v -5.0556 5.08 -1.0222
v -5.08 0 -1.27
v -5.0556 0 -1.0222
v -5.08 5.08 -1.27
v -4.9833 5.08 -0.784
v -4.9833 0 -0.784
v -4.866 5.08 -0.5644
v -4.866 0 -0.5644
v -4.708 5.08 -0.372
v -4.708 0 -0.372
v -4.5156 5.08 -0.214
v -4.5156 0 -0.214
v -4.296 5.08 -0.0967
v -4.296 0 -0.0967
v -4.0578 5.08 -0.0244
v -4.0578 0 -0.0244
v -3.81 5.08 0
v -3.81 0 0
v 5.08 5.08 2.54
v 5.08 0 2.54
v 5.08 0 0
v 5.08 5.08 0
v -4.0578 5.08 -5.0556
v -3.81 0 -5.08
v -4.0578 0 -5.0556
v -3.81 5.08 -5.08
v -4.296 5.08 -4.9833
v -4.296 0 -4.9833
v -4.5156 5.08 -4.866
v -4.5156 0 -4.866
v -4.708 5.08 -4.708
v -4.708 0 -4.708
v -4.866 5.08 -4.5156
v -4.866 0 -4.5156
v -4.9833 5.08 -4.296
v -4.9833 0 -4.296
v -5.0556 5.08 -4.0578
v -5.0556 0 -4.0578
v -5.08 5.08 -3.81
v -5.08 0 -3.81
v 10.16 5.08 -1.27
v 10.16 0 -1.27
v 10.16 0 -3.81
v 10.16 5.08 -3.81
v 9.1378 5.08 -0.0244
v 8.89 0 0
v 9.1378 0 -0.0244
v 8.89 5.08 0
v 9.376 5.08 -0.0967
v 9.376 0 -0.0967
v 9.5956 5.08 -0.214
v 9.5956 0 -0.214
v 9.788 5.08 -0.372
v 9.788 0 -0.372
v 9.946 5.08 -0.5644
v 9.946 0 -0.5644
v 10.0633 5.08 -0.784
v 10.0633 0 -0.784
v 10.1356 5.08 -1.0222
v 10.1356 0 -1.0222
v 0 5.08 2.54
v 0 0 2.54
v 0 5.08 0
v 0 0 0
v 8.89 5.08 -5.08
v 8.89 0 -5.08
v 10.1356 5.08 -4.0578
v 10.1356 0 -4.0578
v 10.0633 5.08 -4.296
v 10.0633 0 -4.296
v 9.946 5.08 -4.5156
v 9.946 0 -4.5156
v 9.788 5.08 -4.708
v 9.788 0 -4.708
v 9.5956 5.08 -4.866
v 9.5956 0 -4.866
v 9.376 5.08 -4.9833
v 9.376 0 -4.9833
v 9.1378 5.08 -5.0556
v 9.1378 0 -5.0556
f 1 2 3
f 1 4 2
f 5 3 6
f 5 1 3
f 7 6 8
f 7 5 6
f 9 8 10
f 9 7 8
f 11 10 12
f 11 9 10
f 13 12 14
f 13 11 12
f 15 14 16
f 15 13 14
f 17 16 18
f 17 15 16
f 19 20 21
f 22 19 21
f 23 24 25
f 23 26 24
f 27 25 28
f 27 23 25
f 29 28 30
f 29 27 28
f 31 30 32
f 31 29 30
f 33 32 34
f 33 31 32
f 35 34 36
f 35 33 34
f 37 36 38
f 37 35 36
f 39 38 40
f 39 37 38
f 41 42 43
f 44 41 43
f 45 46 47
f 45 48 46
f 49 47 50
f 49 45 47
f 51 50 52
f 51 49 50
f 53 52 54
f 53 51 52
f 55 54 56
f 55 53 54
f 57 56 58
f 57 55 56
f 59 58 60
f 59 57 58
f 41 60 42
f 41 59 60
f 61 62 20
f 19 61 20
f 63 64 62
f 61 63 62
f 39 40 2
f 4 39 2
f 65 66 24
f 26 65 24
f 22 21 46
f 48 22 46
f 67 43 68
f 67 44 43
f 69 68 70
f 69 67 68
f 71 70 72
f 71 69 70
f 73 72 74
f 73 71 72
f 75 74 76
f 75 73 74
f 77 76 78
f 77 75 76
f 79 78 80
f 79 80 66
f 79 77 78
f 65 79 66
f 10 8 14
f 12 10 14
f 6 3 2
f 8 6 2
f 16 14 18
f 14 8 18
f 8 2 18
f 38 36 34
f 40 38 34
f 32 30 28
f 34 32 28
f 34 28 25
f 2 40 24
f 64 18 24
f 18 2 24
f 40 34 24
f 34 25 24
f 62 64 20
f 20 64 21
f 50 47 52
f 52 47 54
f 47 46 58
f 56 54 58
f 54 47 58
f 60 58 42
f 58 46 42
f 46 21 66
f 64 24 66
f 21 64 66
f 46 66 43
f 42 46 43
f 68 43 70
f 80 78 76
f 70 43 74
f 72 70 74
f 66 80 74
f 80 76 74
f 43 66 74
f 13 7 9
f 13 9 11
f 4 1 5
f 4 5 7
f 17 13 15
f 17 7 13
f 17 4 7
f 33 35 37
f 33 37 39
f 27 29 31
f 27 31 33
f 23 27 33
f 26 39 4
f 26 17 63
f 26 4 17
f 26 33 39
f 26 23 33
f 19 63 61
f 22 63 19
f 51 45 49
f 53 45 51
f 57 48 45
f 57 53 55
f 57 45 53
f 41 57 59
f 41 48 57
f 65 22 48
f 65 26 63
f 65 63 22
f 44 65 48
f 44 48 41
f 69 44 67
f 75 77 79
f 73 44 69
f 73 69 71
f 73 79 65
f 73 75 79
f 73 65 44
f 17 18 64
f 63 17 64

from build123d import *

# Parameters (mm, degrees)
BOSS_EXTRUDE1_DEPTH = 5.08
FILLET1_R           = 1.27


with BuildPart() as part:
    # Sketch1 → Boss-Extrude1 (new body)
    with BuildSketch(Plane(origin=(0, 0, 0), x_dir=(1, 0, 0), z_dir=(0, 1, 0))):
        Polygon((5.08, 0), (10.16, 0), (10.16, 5.08), (-5.08, 5.08), (-5.08, 0), (0, 0), (0, -2.54), (5.08, -2.54), align=None)
    extrude(amount=BOSS_EXTRUDE1_DEPTH)

    # Fillet1
    fillet1_edges = [part.edges().sort_by_distance(p)[0] for p in [
        (-5.08, 2.54, 0),
        (-5.08, 2.54, -5.08),
        (10.16, 2.54, -5.08),
        (10.16, 2.54, 0),
    ]]
    fillet(fillet1_edges, radius=FILLET1_R)


solid = part.part
